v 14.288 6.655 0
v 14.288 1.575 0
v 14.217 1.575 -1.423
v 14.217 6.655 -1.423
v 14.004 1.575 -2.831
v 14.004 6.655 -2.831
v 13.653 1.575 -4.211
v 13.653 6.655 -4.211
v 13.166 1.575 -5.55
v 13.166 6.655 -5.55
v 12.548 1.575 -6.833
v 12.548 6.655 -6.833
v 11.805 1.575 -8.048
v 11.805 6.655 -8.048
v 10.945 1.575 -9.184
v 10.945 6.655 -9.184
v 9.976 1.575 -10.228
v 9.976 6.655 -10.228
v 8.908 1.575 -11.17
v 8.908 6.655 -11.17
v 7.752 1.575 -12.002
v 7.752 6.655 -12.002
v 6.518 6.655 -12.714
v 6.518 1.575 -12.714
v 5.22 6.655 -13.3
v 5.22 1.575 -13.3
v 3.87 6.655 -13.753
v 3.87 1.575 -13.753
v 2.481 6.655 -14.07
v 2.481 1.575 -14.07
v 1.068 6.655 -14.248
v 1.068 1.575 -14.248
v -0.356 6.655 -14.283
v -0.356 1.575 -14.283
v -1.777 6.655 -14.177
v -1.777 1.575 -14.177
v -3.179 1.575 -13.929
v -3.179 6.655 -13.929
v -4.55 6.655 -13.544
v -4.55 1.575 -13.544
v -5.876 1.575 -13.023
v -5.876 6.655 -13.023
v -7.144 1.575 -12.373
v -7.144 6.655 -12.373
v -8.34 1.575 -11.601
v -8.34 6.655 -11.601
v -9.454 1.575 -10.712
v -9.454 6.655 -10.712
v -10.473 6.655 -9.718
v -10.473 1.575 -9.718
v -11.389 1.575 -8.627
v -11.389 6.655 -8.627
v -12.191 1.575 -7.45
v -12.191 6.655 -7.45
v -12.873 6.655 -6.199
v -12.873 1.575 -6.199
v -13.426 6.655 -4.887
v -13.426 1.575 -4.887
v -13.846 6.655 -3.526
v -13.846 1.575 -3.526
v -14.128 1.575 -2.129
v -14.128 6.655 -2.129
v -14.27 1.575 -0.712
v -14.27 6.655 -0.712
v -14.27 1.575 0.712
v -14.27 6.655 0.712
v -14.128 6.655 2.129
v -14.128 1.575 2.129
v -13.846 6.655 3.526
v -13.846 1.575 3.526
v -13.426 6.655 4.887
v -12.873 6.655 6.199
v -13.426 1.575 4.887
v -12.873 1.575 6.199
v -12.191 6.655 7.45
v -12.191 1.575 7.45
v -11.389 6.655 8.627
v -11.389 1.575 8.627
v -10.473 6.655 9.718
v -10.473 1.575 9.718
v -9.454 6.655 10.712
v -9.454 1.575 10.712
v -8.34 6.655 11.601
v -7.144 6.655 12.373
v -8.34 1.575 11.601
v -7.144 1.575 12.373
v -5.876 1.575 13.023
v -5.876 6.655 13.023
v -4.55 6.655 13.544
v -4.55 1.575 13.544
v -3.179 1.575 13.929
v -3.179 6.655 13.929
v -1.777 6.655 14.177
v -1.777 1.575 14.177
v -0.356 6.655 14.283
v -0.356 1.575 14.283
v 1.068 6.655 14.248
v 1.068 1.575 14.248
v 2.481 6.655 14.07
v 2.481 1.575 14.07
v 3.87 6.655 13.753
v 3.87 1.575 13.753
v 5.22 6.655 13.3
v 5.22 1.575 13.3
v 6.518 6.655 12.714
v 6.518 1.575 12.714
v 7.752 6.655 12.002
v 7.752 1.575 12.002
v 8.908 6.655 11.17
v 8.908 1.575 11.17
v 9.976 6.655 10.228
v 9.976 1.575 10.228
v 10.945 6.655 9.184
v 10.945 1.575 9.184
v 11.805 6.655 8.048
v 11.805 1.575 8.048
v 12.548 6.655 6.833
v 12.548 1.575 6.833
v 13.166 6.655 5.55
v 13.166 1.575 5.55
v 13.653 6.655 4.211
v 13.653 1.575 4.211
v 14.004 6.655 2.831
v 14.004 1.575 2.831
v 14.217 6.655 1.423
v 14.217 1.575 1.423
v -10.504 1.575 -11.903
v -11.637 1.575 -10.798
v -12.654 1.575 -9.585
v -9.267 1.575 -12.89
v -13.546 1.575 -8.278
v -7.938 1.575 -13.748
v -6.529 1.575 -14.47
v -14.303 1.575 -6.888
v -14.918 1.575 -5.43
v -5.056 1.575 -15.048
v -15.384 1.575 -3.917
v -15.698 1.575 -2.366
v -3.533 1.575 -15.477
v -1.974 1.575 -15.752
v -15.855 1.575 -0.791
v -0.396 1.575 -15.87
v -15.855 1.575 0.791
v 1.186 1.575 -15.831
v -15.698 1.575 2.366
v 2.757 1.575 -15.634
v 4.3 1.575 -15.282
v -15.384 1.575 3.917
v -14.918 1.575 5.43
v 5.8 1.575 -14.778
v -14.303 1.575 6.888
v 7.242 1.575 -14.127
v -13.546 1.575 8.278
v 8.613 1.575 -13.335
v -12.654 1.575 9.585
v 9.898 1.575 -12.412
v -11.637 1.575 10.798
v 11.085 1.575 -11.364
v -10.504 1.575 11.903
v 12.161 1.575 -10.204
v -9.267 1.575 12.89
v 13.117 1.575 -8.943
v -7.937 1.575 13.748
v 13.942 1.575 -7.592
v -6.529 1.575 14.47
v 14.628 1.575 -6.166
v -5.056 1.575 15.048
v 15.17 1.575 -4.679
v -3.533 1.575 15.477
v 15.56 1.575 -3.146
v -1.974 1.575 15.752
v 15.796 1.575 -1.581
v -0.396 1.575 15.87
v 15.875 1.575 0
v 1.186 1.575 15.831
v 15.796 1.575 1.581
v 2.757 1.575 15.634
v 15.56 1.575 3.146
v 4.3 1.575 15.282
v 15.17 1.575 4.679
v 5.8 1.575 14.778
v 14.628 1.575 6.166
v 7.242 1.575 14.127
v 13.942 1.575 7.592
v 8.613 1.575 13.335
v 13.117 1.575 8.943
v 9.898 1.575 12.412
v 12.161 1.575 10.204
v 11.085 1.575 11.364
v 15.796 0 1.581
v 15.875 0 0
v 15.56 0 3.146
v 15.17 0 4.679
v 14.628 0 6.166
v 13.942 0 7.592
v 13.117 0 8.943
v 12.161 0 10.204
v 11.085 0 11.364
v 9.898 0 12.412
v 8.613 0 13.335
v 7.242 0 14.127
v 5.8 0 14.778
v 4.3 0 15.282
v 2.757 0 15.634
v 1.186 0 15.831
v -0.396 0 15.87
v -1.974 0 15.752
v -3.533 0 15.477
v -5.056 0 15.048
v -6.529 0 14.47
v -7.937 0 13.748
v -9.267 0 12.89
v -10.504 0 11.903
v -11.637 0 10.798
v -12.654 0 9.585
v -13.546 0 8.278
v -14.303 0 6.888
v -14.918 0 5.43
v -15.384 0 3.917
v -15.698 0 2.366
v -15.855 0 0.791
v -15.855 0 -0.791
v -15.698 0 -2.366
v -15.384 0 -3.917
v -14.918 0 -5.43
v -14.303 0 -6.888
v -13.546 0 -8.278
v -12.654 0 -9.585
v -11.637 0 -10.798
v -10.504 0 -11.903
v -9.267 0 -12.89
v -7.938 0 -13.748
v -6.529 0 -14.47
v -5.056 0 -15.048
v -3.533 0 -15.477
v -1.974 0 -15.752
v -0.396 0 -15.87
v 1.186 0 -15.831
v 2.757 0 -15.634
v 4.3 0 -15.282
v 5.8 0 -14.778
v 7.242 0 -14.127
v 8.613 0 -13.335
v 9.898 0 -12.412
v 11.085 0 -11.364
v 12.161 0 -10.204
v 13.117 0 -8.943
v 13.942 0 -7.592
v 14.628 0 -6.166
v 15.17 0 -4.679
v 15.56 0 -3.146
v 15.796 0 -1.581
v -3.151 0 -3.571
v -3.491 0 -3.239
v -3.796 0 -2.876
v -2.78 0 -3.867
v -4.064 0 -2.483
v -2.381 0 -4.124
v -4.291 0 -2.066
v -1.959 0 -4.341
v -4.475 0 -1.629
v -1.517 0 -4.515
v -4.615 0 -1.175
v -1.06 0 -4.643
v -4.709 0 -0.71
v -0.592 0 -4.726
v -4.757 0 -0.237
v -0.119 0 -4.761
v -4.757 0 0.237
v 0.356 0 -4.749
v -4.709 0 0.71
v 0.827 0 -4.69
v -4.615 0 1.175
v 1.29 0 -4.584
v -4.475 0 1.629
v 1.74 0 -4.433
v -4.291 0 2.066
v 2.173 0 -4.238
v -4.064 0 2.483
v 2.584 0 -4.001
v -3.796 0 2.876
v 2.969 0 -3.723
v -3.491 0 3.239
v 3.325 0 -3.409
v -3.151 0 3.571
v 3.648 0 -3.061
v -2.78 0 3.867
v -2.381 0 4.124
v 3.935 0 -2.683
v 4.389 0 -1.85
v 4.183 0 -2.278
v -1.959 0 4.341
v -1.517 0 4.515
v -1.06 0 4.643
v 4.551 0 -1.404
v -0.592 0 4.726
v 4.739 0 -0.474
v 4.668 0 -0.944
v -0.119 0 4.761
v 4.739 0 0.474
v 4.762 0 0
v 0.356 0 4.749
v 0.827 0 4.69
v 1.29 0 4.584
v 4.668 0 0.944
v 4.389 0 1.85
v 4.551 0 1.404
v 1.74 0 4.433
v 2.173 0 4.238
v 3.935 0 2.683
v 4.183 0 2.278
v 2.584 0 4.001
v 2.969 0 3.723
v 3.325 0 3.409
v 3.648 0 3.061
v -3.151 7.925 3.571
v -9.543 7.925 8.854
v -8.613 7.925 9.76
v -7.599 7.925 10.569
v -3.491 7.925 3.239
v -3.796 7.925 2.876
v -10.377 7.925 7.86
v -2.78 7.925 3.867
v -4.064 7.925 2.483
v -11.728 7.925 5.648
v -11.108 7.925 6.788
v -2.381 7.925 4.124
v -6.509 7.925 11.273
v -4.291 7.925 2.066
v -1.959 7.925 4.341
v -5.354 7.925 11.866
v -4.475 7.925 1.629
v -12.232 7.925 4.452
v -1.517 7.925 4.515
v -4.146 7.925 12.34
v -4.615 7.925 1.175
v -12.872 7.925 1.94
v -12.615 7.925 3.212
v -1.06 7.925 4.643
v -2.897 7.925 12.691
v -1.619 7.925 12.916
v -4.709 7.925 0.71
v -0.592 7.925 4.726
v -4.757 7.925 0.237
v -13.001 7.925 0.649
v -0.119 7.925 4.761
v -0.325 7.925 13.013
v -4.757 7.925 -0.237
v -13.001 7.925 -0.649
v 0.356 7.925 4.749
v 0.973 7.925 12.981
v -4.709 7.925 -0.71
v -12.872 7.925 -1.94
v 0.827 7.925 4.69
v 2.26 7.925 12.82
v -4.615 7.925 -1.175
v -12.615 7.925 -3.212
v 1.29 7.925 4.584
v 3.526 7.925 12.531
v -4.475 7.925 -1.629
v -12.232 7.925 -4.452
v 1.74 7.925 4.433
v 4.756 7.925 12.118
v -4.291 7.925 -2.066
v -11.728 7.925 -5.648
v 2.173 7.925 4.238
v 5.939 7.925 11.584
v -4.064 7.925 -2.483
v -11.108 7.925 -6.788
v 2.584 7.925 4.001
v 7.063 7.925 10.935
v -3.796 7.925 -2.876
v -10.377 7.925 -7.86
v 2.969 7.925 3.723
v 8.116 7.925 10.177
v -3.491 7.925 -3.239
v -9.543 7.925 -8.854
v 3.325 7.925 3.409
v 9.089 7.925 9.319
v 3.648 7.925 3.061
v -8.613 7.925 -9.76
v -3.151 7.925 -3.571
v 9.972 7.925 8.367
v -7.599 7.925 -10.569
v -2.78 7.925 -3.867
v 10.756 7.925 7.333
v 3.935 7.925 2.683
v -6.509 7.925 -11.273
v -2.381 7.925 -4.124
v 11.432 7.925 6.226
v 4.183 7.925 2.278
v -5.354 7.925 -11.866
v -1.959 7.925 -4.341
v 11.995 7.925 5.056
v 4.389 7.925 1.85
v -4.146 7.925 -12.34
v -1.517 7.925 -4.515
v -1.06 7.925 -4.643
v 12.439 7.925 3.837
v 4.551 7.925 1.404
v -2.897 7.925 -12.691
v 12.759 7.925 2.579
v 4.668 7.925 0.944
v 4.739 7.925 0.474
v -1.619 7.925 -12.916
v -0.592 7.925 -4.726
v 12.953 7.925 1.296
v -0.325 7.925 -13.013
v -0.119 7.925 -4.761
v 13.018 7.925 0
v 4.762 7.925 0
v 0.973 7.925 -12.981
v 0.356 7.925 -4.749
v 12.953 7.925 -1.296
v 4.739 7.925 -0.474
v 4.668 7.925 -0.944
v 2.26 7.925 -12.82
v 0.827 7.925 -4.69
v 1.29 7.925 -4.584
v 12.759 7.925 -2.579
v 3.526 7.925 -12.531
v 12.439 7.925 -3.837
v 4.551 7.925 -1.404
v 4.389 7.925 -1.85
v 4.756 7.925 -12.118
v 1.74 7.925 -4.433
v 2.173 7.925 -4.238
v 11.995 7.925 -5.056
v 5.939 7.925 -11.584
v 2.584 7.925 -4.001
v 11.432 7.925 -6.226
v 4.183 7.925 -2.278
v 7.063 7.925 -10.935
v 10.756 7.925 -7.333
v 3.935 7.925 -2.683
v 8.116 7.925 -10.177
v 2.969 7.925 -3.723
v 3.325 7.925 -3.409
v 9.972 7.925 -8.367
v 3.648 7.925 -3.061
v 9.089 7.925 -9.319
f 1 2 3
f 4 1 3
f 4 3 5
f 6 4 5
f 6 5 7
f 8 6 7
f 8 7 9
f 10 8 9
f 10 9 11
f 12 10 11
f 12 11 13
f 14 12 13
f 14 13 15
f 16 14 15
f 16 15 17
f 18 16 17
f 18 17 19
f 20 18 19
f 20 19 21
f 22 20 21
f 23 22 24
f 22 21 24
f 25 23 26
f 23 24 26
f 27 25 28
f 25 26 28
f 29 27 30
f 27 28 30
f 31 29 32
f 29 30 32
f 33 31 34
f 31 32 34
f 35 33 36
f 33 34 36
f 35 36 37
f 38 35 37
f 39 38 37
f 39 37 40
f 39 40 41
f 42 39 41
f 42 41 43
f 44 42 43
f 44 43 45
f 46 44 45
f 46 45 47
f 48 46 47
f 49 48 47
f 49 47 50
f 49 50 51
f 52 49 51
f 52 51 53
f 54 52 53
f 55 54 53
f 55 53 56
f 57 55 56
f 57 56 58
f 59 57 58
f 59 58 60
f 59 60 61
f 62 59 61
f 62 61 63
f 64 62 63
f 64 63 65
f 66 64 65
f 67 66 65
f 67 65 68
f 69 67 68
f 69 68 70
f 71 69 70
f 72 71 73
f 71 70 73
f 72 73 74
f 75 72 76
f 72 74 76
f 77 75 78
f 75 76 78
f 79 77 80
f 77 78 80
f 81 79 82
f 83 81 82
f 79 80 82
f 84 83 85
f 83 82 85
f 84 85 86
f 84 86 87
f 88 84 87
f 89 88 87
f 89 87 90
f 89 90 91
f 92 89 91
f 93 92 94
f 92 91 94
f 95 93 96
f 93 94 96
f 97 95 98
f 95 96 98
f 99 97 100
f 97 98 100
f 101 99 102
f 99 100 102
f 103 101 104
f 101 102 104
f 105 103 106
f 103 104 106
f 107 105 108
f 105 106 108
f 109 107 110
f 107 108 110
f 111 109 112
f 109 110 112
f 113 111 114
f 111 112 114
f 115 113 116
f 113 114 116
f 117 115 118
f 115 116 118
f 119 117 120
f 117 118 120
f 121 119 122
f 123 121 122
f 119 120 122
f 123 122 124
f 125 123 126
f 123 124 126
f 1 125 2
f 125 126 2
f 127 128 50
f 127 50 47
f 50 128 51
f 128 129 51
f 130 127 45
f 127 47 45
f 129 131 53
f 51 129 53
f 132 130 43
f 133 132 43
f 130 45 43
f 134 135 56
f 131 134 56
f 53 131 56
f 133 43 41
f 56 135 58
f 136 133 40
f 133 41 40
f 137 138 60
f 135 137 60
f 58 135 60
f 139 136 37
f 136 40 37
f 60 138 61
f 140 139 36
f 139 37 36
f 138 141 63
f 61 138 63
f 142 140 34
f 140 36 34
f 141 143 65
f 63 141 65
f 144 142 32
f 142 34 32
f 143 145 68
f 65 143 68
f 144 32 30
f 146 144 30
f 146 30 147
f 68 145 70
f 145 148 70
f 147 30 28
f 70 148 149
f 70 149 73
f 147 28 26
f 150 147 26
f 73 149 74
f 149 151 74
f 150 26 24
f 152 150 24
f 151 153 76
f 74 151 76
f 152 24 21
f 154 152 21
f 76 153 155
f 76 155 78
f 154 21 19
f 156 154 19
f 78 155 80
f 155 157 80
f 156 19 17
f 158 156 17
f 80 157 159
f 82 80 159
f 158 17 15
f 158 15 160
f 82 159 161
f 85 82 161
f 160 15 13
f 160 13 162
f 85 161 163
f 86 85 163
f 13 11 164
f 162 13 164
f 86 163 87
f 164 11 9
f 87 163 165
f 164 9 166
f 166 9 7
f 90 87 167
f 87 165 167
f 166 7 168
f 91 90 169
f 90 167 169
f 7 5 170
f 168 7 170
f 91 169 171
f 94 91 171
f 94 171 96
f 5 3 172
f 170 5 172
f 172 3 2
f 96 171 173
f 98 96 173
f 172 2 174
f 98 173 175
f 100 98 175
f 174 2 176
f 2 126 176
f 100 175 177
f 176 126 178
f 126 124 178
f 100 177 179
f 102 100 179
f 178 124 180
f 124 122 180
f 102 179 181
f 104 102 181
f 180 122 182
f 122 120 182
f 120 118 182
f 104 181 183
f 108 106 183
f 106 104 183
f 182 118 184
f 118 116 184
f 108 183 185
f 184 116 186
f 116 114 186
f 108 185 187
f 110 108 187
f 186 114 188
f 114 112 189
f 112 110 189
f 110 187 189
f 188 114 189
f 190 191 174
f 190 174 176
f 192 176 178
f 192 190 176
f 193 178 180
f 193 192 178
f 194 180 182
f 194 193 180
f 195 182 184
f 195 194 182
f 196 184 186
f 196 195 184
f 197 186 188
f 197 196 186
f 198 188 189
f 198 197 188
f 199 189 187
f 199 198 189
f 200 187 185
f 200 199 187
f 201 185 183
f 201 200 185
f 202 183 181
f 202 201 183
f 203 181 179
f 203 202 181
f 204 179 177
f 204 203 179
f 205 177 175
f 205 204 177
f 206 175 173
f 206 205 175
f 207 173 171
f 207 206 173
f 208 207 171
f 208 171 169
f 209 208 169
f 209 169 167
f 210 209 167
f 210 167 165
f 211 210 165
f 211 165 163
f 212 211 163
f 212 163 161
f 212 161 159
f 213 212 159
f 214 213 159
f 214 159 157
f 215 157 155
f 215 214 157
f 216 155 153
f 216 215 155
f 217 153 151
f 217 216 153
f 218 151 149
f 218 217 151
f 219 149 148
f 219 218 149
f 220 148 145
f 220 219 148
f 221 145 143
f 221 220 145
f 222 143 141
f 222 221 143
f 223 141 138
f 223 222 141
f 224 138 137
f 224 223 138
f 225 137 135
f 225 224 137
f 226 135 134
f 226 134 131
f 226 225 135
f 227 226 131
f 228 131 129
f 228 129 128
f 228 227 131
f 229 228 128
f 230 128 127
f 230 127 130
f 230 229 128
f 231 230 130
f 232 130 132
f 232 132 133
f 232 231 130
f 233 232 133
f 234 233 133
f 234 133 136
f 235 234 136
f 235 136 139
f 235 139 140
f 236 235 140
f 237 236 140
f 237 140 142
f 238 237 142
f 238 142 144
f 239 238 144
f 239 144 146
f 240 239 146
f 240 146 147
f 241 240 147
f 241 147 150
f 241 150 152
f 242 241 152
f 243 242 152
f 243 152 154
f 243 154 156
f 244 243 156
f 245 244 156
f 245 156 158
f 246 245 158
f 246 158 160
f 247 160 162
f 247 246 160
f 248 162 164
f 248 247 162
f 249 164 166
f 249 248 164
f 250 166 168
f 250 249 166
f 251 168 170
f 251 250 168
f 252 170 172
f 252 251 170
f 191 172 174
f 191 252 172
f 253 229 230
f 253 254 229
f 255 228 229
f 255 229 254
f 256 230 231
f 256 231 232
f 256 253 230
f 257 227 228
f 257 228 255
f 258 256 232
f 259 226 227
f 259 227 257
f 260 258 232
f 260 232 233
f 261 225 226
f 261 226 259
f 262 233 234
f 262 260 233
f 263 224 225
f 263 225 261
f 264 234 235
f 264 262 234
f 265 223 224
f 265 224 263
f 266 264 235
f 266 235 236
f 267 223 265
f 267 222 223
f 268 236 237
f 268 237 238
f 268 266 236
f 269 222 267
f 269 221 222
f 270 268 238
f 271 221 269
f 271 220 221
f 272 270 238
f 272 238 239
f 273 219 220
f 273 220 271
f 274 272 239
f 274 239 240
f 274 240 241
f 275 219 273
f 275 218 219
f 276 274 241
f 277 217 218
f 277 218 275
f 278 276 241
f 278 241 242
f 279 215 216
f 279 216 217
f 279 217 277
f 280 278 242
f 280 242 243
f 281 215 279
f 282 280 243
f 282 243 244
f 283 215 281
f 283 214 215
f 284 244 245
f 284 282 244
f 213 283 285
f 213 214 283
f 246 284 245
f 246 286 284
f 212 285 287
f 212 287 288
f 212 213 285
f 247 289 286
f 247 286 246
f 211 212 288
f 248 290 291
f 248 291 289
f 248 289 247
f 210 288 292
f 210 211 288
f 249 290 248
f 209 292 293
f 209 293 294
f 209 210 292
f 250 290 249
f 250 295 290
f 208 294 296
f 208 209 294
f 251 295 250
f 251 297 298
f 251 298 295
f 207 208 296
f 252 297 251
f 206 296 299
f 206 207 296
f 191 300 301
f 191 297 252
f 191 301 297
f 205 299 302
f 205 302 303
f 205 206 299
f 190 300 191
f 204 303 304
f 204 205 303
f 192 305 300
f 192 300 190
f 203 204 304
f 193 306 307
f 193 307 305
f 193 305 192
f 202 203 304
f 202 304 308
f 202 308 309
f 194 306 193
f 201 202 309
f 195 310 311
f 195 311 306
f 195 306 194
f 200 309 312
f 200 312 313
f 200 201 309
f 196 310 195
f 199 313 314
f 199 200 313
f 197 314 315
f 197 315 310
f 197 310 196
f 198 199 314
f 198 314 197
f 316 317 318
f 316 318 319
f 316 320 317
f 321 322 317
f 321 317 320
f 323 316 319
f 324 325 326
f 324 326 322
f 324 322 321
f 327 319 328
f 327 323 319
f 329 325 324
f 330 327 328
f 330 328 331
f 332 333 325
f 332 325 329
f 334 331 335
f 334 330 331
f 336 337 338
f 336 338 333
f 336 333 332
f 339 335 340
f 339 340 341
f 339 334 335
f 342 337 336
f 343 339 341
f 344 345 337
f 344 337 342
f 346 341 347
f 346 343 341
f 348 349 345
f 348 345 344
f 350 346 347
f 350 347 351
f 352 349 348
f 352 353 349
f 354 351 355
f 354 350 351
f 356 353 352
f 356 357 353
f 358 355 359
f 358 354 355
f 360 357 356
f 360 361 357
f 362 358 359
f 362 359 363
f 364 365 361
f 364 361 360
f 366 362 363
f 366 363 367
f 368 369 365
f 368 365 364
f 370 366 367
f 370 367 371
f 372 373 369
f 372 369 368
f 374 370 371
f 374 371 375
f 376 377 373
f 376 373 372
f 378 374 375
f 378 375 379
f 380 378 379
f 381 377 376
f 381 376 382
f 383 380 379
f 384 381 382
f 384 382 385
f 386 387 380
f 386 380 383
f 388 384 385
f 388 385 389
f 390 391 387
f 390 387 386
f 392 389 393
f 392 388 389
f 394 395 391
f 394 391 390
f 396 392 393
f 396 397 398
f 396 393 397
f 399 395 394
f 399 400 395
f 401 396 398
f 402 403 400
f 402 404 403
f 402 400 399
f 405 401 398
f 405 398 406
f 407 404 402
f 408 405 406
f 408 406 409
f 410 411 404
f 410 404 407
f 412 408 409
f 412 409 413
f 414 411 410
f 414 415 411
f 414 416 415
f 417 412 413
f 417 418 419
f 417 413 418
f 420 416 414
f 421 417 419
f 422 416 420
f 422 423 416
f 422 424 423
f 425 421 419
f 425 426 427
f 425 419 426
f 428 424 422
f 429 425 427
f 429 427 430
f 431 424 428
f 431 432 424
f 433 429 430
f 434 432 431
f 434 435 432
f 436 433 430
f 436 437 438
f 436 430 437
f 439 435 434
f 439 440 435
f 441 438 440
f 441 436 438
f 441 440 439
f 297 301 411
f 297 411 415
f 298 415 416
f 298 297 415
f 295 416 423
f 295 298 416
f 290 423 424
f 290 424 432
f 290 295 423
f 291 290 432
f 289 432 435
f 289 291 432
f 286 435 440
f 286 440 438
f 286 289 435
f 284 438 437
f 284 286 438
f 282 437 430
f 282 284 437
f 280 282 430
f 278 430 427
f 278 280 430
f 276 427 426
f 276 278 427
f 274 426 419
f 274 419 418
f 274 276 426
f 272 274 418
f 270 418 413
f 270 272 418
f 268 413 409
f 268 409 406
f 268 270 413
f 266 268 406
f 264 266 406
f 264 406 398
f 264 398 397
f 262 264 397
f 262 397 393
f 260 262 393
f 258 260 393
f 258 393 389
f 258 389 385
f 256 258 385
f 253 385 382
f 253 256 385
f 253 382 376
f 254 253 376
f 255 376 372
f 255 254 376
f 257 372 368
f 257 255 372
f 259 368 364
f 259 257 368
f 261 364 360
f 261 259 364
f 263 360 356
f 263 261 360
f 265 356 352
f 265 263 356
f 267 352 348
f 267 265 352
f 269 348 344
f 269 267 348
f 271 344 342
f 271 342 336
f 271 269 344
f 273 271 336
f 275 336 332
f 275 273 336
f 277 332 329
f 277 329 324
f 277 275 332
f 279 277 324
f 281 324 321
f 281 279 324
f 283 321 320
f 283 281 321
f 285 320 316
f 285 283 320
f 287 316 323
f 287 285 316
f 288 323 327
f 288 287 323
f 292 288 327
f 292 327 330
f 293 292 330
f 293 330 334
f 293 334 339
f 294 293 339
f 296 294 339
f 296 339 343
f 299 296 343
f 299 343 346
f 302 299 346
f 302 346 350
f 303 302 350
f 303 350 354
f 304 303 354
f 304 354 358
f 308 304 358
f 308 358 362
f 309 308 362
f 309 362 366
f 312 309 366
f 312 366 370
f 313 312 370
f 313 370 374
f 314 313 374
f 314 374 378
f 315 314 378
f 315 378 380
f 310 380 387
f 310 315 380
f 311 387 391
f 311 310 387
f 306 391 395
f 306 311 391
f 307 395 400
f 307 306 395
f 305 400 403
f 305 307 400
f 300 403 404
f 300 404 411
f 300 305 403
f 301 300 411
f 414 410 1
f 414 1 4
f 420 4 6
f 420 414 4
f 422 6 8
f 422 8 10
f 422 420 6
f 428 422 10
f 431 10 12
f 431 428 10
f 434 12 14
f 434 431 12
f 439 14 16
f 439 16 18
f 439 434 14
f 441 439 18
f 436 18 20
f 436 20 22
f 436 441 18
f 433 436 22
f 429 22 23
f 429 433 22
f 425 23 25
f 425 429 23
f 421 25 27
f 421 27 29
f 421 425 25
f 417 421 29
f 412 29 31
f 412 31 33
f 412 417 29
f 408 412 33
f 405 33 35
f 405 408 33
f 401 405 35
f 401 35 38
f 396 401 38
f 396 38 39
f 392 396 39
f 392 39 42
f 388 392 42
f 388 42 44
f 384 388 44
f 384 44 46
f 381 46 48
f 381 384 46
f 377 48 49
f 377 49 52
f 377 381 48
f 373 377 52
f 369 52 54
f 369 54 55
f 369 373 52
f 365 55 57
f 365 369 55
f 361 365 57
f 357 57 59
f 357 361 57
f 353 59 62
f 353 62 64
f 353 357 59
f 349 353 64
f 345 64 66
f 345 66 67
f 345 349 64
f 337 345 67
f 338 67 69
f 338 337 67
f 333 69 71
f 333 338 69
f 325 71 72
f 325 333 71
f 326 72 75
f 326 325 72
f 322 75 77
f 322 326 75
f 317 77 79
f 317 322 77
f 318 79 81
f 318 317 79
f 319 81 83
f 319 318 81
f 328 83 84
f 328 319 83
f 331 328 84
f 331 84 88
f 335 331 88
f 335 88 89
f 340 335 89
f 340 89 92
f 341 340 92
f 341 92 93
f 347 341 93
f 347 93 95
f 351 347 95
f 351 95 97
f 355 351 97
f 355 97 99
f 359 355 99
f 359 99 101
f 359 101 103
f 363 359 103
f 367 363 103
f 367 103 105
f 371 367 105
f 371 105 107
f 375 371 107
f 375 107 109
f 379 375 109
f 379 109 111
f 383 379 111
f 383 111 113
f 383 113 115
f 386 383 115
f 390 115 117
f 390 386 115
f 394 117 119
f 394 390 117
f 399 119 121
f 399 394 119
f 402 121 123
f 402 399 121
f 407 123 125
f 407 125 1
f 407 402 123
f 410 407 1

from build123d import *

# Parameters (mm, degrees)
SKETCH1_R           = 14.2875
SKETCH1_R_2         = 4.7625
BOSS_EXTRUDE1_DEPTH = 7.9248
SKETCH2_R           = 15.875
SKETCH2_R_2         = 14.2875
BOSS_EXTRUDE2_DEPTH = 1.5748
CHAMFER1_SIZE       = 1.27


with BuildPart() as part:
    # Sketch1 → Boss-Extrude1 (new body)
    with BuildSketch(Plane(origin=(0, 0, 0), x_dir=(1, 0, 0), z_dir=(0, 1, 0))):
        Circle(SKETCH1_R)
        Circle(SKETCH1_R_2, mode=Mode.SUBTRACT)
    extrude(amount=BOSS_EXTRUDE1_DEPTH)

    # Sketch2 → Boss-Extrude2 (add)
    with BuildSketch(Plane.XZ):
        Circle(SKETCH2_R)
        Circle(SKETCH2_R_2, mode=Mode.SUBTRACT)
    extrude(amount=-BOSS_EXTRUDE2_DEPTH)

    # Chamfer1
    chamfer1_edges = [part.edges().sort_by_distance(p)[0] for p in [
        (-14.2875, 7.9248, 0),
    ]]
    chamfer(chamfer1_edges, length=CHAMFER1_SIZE)


solid = part.part
